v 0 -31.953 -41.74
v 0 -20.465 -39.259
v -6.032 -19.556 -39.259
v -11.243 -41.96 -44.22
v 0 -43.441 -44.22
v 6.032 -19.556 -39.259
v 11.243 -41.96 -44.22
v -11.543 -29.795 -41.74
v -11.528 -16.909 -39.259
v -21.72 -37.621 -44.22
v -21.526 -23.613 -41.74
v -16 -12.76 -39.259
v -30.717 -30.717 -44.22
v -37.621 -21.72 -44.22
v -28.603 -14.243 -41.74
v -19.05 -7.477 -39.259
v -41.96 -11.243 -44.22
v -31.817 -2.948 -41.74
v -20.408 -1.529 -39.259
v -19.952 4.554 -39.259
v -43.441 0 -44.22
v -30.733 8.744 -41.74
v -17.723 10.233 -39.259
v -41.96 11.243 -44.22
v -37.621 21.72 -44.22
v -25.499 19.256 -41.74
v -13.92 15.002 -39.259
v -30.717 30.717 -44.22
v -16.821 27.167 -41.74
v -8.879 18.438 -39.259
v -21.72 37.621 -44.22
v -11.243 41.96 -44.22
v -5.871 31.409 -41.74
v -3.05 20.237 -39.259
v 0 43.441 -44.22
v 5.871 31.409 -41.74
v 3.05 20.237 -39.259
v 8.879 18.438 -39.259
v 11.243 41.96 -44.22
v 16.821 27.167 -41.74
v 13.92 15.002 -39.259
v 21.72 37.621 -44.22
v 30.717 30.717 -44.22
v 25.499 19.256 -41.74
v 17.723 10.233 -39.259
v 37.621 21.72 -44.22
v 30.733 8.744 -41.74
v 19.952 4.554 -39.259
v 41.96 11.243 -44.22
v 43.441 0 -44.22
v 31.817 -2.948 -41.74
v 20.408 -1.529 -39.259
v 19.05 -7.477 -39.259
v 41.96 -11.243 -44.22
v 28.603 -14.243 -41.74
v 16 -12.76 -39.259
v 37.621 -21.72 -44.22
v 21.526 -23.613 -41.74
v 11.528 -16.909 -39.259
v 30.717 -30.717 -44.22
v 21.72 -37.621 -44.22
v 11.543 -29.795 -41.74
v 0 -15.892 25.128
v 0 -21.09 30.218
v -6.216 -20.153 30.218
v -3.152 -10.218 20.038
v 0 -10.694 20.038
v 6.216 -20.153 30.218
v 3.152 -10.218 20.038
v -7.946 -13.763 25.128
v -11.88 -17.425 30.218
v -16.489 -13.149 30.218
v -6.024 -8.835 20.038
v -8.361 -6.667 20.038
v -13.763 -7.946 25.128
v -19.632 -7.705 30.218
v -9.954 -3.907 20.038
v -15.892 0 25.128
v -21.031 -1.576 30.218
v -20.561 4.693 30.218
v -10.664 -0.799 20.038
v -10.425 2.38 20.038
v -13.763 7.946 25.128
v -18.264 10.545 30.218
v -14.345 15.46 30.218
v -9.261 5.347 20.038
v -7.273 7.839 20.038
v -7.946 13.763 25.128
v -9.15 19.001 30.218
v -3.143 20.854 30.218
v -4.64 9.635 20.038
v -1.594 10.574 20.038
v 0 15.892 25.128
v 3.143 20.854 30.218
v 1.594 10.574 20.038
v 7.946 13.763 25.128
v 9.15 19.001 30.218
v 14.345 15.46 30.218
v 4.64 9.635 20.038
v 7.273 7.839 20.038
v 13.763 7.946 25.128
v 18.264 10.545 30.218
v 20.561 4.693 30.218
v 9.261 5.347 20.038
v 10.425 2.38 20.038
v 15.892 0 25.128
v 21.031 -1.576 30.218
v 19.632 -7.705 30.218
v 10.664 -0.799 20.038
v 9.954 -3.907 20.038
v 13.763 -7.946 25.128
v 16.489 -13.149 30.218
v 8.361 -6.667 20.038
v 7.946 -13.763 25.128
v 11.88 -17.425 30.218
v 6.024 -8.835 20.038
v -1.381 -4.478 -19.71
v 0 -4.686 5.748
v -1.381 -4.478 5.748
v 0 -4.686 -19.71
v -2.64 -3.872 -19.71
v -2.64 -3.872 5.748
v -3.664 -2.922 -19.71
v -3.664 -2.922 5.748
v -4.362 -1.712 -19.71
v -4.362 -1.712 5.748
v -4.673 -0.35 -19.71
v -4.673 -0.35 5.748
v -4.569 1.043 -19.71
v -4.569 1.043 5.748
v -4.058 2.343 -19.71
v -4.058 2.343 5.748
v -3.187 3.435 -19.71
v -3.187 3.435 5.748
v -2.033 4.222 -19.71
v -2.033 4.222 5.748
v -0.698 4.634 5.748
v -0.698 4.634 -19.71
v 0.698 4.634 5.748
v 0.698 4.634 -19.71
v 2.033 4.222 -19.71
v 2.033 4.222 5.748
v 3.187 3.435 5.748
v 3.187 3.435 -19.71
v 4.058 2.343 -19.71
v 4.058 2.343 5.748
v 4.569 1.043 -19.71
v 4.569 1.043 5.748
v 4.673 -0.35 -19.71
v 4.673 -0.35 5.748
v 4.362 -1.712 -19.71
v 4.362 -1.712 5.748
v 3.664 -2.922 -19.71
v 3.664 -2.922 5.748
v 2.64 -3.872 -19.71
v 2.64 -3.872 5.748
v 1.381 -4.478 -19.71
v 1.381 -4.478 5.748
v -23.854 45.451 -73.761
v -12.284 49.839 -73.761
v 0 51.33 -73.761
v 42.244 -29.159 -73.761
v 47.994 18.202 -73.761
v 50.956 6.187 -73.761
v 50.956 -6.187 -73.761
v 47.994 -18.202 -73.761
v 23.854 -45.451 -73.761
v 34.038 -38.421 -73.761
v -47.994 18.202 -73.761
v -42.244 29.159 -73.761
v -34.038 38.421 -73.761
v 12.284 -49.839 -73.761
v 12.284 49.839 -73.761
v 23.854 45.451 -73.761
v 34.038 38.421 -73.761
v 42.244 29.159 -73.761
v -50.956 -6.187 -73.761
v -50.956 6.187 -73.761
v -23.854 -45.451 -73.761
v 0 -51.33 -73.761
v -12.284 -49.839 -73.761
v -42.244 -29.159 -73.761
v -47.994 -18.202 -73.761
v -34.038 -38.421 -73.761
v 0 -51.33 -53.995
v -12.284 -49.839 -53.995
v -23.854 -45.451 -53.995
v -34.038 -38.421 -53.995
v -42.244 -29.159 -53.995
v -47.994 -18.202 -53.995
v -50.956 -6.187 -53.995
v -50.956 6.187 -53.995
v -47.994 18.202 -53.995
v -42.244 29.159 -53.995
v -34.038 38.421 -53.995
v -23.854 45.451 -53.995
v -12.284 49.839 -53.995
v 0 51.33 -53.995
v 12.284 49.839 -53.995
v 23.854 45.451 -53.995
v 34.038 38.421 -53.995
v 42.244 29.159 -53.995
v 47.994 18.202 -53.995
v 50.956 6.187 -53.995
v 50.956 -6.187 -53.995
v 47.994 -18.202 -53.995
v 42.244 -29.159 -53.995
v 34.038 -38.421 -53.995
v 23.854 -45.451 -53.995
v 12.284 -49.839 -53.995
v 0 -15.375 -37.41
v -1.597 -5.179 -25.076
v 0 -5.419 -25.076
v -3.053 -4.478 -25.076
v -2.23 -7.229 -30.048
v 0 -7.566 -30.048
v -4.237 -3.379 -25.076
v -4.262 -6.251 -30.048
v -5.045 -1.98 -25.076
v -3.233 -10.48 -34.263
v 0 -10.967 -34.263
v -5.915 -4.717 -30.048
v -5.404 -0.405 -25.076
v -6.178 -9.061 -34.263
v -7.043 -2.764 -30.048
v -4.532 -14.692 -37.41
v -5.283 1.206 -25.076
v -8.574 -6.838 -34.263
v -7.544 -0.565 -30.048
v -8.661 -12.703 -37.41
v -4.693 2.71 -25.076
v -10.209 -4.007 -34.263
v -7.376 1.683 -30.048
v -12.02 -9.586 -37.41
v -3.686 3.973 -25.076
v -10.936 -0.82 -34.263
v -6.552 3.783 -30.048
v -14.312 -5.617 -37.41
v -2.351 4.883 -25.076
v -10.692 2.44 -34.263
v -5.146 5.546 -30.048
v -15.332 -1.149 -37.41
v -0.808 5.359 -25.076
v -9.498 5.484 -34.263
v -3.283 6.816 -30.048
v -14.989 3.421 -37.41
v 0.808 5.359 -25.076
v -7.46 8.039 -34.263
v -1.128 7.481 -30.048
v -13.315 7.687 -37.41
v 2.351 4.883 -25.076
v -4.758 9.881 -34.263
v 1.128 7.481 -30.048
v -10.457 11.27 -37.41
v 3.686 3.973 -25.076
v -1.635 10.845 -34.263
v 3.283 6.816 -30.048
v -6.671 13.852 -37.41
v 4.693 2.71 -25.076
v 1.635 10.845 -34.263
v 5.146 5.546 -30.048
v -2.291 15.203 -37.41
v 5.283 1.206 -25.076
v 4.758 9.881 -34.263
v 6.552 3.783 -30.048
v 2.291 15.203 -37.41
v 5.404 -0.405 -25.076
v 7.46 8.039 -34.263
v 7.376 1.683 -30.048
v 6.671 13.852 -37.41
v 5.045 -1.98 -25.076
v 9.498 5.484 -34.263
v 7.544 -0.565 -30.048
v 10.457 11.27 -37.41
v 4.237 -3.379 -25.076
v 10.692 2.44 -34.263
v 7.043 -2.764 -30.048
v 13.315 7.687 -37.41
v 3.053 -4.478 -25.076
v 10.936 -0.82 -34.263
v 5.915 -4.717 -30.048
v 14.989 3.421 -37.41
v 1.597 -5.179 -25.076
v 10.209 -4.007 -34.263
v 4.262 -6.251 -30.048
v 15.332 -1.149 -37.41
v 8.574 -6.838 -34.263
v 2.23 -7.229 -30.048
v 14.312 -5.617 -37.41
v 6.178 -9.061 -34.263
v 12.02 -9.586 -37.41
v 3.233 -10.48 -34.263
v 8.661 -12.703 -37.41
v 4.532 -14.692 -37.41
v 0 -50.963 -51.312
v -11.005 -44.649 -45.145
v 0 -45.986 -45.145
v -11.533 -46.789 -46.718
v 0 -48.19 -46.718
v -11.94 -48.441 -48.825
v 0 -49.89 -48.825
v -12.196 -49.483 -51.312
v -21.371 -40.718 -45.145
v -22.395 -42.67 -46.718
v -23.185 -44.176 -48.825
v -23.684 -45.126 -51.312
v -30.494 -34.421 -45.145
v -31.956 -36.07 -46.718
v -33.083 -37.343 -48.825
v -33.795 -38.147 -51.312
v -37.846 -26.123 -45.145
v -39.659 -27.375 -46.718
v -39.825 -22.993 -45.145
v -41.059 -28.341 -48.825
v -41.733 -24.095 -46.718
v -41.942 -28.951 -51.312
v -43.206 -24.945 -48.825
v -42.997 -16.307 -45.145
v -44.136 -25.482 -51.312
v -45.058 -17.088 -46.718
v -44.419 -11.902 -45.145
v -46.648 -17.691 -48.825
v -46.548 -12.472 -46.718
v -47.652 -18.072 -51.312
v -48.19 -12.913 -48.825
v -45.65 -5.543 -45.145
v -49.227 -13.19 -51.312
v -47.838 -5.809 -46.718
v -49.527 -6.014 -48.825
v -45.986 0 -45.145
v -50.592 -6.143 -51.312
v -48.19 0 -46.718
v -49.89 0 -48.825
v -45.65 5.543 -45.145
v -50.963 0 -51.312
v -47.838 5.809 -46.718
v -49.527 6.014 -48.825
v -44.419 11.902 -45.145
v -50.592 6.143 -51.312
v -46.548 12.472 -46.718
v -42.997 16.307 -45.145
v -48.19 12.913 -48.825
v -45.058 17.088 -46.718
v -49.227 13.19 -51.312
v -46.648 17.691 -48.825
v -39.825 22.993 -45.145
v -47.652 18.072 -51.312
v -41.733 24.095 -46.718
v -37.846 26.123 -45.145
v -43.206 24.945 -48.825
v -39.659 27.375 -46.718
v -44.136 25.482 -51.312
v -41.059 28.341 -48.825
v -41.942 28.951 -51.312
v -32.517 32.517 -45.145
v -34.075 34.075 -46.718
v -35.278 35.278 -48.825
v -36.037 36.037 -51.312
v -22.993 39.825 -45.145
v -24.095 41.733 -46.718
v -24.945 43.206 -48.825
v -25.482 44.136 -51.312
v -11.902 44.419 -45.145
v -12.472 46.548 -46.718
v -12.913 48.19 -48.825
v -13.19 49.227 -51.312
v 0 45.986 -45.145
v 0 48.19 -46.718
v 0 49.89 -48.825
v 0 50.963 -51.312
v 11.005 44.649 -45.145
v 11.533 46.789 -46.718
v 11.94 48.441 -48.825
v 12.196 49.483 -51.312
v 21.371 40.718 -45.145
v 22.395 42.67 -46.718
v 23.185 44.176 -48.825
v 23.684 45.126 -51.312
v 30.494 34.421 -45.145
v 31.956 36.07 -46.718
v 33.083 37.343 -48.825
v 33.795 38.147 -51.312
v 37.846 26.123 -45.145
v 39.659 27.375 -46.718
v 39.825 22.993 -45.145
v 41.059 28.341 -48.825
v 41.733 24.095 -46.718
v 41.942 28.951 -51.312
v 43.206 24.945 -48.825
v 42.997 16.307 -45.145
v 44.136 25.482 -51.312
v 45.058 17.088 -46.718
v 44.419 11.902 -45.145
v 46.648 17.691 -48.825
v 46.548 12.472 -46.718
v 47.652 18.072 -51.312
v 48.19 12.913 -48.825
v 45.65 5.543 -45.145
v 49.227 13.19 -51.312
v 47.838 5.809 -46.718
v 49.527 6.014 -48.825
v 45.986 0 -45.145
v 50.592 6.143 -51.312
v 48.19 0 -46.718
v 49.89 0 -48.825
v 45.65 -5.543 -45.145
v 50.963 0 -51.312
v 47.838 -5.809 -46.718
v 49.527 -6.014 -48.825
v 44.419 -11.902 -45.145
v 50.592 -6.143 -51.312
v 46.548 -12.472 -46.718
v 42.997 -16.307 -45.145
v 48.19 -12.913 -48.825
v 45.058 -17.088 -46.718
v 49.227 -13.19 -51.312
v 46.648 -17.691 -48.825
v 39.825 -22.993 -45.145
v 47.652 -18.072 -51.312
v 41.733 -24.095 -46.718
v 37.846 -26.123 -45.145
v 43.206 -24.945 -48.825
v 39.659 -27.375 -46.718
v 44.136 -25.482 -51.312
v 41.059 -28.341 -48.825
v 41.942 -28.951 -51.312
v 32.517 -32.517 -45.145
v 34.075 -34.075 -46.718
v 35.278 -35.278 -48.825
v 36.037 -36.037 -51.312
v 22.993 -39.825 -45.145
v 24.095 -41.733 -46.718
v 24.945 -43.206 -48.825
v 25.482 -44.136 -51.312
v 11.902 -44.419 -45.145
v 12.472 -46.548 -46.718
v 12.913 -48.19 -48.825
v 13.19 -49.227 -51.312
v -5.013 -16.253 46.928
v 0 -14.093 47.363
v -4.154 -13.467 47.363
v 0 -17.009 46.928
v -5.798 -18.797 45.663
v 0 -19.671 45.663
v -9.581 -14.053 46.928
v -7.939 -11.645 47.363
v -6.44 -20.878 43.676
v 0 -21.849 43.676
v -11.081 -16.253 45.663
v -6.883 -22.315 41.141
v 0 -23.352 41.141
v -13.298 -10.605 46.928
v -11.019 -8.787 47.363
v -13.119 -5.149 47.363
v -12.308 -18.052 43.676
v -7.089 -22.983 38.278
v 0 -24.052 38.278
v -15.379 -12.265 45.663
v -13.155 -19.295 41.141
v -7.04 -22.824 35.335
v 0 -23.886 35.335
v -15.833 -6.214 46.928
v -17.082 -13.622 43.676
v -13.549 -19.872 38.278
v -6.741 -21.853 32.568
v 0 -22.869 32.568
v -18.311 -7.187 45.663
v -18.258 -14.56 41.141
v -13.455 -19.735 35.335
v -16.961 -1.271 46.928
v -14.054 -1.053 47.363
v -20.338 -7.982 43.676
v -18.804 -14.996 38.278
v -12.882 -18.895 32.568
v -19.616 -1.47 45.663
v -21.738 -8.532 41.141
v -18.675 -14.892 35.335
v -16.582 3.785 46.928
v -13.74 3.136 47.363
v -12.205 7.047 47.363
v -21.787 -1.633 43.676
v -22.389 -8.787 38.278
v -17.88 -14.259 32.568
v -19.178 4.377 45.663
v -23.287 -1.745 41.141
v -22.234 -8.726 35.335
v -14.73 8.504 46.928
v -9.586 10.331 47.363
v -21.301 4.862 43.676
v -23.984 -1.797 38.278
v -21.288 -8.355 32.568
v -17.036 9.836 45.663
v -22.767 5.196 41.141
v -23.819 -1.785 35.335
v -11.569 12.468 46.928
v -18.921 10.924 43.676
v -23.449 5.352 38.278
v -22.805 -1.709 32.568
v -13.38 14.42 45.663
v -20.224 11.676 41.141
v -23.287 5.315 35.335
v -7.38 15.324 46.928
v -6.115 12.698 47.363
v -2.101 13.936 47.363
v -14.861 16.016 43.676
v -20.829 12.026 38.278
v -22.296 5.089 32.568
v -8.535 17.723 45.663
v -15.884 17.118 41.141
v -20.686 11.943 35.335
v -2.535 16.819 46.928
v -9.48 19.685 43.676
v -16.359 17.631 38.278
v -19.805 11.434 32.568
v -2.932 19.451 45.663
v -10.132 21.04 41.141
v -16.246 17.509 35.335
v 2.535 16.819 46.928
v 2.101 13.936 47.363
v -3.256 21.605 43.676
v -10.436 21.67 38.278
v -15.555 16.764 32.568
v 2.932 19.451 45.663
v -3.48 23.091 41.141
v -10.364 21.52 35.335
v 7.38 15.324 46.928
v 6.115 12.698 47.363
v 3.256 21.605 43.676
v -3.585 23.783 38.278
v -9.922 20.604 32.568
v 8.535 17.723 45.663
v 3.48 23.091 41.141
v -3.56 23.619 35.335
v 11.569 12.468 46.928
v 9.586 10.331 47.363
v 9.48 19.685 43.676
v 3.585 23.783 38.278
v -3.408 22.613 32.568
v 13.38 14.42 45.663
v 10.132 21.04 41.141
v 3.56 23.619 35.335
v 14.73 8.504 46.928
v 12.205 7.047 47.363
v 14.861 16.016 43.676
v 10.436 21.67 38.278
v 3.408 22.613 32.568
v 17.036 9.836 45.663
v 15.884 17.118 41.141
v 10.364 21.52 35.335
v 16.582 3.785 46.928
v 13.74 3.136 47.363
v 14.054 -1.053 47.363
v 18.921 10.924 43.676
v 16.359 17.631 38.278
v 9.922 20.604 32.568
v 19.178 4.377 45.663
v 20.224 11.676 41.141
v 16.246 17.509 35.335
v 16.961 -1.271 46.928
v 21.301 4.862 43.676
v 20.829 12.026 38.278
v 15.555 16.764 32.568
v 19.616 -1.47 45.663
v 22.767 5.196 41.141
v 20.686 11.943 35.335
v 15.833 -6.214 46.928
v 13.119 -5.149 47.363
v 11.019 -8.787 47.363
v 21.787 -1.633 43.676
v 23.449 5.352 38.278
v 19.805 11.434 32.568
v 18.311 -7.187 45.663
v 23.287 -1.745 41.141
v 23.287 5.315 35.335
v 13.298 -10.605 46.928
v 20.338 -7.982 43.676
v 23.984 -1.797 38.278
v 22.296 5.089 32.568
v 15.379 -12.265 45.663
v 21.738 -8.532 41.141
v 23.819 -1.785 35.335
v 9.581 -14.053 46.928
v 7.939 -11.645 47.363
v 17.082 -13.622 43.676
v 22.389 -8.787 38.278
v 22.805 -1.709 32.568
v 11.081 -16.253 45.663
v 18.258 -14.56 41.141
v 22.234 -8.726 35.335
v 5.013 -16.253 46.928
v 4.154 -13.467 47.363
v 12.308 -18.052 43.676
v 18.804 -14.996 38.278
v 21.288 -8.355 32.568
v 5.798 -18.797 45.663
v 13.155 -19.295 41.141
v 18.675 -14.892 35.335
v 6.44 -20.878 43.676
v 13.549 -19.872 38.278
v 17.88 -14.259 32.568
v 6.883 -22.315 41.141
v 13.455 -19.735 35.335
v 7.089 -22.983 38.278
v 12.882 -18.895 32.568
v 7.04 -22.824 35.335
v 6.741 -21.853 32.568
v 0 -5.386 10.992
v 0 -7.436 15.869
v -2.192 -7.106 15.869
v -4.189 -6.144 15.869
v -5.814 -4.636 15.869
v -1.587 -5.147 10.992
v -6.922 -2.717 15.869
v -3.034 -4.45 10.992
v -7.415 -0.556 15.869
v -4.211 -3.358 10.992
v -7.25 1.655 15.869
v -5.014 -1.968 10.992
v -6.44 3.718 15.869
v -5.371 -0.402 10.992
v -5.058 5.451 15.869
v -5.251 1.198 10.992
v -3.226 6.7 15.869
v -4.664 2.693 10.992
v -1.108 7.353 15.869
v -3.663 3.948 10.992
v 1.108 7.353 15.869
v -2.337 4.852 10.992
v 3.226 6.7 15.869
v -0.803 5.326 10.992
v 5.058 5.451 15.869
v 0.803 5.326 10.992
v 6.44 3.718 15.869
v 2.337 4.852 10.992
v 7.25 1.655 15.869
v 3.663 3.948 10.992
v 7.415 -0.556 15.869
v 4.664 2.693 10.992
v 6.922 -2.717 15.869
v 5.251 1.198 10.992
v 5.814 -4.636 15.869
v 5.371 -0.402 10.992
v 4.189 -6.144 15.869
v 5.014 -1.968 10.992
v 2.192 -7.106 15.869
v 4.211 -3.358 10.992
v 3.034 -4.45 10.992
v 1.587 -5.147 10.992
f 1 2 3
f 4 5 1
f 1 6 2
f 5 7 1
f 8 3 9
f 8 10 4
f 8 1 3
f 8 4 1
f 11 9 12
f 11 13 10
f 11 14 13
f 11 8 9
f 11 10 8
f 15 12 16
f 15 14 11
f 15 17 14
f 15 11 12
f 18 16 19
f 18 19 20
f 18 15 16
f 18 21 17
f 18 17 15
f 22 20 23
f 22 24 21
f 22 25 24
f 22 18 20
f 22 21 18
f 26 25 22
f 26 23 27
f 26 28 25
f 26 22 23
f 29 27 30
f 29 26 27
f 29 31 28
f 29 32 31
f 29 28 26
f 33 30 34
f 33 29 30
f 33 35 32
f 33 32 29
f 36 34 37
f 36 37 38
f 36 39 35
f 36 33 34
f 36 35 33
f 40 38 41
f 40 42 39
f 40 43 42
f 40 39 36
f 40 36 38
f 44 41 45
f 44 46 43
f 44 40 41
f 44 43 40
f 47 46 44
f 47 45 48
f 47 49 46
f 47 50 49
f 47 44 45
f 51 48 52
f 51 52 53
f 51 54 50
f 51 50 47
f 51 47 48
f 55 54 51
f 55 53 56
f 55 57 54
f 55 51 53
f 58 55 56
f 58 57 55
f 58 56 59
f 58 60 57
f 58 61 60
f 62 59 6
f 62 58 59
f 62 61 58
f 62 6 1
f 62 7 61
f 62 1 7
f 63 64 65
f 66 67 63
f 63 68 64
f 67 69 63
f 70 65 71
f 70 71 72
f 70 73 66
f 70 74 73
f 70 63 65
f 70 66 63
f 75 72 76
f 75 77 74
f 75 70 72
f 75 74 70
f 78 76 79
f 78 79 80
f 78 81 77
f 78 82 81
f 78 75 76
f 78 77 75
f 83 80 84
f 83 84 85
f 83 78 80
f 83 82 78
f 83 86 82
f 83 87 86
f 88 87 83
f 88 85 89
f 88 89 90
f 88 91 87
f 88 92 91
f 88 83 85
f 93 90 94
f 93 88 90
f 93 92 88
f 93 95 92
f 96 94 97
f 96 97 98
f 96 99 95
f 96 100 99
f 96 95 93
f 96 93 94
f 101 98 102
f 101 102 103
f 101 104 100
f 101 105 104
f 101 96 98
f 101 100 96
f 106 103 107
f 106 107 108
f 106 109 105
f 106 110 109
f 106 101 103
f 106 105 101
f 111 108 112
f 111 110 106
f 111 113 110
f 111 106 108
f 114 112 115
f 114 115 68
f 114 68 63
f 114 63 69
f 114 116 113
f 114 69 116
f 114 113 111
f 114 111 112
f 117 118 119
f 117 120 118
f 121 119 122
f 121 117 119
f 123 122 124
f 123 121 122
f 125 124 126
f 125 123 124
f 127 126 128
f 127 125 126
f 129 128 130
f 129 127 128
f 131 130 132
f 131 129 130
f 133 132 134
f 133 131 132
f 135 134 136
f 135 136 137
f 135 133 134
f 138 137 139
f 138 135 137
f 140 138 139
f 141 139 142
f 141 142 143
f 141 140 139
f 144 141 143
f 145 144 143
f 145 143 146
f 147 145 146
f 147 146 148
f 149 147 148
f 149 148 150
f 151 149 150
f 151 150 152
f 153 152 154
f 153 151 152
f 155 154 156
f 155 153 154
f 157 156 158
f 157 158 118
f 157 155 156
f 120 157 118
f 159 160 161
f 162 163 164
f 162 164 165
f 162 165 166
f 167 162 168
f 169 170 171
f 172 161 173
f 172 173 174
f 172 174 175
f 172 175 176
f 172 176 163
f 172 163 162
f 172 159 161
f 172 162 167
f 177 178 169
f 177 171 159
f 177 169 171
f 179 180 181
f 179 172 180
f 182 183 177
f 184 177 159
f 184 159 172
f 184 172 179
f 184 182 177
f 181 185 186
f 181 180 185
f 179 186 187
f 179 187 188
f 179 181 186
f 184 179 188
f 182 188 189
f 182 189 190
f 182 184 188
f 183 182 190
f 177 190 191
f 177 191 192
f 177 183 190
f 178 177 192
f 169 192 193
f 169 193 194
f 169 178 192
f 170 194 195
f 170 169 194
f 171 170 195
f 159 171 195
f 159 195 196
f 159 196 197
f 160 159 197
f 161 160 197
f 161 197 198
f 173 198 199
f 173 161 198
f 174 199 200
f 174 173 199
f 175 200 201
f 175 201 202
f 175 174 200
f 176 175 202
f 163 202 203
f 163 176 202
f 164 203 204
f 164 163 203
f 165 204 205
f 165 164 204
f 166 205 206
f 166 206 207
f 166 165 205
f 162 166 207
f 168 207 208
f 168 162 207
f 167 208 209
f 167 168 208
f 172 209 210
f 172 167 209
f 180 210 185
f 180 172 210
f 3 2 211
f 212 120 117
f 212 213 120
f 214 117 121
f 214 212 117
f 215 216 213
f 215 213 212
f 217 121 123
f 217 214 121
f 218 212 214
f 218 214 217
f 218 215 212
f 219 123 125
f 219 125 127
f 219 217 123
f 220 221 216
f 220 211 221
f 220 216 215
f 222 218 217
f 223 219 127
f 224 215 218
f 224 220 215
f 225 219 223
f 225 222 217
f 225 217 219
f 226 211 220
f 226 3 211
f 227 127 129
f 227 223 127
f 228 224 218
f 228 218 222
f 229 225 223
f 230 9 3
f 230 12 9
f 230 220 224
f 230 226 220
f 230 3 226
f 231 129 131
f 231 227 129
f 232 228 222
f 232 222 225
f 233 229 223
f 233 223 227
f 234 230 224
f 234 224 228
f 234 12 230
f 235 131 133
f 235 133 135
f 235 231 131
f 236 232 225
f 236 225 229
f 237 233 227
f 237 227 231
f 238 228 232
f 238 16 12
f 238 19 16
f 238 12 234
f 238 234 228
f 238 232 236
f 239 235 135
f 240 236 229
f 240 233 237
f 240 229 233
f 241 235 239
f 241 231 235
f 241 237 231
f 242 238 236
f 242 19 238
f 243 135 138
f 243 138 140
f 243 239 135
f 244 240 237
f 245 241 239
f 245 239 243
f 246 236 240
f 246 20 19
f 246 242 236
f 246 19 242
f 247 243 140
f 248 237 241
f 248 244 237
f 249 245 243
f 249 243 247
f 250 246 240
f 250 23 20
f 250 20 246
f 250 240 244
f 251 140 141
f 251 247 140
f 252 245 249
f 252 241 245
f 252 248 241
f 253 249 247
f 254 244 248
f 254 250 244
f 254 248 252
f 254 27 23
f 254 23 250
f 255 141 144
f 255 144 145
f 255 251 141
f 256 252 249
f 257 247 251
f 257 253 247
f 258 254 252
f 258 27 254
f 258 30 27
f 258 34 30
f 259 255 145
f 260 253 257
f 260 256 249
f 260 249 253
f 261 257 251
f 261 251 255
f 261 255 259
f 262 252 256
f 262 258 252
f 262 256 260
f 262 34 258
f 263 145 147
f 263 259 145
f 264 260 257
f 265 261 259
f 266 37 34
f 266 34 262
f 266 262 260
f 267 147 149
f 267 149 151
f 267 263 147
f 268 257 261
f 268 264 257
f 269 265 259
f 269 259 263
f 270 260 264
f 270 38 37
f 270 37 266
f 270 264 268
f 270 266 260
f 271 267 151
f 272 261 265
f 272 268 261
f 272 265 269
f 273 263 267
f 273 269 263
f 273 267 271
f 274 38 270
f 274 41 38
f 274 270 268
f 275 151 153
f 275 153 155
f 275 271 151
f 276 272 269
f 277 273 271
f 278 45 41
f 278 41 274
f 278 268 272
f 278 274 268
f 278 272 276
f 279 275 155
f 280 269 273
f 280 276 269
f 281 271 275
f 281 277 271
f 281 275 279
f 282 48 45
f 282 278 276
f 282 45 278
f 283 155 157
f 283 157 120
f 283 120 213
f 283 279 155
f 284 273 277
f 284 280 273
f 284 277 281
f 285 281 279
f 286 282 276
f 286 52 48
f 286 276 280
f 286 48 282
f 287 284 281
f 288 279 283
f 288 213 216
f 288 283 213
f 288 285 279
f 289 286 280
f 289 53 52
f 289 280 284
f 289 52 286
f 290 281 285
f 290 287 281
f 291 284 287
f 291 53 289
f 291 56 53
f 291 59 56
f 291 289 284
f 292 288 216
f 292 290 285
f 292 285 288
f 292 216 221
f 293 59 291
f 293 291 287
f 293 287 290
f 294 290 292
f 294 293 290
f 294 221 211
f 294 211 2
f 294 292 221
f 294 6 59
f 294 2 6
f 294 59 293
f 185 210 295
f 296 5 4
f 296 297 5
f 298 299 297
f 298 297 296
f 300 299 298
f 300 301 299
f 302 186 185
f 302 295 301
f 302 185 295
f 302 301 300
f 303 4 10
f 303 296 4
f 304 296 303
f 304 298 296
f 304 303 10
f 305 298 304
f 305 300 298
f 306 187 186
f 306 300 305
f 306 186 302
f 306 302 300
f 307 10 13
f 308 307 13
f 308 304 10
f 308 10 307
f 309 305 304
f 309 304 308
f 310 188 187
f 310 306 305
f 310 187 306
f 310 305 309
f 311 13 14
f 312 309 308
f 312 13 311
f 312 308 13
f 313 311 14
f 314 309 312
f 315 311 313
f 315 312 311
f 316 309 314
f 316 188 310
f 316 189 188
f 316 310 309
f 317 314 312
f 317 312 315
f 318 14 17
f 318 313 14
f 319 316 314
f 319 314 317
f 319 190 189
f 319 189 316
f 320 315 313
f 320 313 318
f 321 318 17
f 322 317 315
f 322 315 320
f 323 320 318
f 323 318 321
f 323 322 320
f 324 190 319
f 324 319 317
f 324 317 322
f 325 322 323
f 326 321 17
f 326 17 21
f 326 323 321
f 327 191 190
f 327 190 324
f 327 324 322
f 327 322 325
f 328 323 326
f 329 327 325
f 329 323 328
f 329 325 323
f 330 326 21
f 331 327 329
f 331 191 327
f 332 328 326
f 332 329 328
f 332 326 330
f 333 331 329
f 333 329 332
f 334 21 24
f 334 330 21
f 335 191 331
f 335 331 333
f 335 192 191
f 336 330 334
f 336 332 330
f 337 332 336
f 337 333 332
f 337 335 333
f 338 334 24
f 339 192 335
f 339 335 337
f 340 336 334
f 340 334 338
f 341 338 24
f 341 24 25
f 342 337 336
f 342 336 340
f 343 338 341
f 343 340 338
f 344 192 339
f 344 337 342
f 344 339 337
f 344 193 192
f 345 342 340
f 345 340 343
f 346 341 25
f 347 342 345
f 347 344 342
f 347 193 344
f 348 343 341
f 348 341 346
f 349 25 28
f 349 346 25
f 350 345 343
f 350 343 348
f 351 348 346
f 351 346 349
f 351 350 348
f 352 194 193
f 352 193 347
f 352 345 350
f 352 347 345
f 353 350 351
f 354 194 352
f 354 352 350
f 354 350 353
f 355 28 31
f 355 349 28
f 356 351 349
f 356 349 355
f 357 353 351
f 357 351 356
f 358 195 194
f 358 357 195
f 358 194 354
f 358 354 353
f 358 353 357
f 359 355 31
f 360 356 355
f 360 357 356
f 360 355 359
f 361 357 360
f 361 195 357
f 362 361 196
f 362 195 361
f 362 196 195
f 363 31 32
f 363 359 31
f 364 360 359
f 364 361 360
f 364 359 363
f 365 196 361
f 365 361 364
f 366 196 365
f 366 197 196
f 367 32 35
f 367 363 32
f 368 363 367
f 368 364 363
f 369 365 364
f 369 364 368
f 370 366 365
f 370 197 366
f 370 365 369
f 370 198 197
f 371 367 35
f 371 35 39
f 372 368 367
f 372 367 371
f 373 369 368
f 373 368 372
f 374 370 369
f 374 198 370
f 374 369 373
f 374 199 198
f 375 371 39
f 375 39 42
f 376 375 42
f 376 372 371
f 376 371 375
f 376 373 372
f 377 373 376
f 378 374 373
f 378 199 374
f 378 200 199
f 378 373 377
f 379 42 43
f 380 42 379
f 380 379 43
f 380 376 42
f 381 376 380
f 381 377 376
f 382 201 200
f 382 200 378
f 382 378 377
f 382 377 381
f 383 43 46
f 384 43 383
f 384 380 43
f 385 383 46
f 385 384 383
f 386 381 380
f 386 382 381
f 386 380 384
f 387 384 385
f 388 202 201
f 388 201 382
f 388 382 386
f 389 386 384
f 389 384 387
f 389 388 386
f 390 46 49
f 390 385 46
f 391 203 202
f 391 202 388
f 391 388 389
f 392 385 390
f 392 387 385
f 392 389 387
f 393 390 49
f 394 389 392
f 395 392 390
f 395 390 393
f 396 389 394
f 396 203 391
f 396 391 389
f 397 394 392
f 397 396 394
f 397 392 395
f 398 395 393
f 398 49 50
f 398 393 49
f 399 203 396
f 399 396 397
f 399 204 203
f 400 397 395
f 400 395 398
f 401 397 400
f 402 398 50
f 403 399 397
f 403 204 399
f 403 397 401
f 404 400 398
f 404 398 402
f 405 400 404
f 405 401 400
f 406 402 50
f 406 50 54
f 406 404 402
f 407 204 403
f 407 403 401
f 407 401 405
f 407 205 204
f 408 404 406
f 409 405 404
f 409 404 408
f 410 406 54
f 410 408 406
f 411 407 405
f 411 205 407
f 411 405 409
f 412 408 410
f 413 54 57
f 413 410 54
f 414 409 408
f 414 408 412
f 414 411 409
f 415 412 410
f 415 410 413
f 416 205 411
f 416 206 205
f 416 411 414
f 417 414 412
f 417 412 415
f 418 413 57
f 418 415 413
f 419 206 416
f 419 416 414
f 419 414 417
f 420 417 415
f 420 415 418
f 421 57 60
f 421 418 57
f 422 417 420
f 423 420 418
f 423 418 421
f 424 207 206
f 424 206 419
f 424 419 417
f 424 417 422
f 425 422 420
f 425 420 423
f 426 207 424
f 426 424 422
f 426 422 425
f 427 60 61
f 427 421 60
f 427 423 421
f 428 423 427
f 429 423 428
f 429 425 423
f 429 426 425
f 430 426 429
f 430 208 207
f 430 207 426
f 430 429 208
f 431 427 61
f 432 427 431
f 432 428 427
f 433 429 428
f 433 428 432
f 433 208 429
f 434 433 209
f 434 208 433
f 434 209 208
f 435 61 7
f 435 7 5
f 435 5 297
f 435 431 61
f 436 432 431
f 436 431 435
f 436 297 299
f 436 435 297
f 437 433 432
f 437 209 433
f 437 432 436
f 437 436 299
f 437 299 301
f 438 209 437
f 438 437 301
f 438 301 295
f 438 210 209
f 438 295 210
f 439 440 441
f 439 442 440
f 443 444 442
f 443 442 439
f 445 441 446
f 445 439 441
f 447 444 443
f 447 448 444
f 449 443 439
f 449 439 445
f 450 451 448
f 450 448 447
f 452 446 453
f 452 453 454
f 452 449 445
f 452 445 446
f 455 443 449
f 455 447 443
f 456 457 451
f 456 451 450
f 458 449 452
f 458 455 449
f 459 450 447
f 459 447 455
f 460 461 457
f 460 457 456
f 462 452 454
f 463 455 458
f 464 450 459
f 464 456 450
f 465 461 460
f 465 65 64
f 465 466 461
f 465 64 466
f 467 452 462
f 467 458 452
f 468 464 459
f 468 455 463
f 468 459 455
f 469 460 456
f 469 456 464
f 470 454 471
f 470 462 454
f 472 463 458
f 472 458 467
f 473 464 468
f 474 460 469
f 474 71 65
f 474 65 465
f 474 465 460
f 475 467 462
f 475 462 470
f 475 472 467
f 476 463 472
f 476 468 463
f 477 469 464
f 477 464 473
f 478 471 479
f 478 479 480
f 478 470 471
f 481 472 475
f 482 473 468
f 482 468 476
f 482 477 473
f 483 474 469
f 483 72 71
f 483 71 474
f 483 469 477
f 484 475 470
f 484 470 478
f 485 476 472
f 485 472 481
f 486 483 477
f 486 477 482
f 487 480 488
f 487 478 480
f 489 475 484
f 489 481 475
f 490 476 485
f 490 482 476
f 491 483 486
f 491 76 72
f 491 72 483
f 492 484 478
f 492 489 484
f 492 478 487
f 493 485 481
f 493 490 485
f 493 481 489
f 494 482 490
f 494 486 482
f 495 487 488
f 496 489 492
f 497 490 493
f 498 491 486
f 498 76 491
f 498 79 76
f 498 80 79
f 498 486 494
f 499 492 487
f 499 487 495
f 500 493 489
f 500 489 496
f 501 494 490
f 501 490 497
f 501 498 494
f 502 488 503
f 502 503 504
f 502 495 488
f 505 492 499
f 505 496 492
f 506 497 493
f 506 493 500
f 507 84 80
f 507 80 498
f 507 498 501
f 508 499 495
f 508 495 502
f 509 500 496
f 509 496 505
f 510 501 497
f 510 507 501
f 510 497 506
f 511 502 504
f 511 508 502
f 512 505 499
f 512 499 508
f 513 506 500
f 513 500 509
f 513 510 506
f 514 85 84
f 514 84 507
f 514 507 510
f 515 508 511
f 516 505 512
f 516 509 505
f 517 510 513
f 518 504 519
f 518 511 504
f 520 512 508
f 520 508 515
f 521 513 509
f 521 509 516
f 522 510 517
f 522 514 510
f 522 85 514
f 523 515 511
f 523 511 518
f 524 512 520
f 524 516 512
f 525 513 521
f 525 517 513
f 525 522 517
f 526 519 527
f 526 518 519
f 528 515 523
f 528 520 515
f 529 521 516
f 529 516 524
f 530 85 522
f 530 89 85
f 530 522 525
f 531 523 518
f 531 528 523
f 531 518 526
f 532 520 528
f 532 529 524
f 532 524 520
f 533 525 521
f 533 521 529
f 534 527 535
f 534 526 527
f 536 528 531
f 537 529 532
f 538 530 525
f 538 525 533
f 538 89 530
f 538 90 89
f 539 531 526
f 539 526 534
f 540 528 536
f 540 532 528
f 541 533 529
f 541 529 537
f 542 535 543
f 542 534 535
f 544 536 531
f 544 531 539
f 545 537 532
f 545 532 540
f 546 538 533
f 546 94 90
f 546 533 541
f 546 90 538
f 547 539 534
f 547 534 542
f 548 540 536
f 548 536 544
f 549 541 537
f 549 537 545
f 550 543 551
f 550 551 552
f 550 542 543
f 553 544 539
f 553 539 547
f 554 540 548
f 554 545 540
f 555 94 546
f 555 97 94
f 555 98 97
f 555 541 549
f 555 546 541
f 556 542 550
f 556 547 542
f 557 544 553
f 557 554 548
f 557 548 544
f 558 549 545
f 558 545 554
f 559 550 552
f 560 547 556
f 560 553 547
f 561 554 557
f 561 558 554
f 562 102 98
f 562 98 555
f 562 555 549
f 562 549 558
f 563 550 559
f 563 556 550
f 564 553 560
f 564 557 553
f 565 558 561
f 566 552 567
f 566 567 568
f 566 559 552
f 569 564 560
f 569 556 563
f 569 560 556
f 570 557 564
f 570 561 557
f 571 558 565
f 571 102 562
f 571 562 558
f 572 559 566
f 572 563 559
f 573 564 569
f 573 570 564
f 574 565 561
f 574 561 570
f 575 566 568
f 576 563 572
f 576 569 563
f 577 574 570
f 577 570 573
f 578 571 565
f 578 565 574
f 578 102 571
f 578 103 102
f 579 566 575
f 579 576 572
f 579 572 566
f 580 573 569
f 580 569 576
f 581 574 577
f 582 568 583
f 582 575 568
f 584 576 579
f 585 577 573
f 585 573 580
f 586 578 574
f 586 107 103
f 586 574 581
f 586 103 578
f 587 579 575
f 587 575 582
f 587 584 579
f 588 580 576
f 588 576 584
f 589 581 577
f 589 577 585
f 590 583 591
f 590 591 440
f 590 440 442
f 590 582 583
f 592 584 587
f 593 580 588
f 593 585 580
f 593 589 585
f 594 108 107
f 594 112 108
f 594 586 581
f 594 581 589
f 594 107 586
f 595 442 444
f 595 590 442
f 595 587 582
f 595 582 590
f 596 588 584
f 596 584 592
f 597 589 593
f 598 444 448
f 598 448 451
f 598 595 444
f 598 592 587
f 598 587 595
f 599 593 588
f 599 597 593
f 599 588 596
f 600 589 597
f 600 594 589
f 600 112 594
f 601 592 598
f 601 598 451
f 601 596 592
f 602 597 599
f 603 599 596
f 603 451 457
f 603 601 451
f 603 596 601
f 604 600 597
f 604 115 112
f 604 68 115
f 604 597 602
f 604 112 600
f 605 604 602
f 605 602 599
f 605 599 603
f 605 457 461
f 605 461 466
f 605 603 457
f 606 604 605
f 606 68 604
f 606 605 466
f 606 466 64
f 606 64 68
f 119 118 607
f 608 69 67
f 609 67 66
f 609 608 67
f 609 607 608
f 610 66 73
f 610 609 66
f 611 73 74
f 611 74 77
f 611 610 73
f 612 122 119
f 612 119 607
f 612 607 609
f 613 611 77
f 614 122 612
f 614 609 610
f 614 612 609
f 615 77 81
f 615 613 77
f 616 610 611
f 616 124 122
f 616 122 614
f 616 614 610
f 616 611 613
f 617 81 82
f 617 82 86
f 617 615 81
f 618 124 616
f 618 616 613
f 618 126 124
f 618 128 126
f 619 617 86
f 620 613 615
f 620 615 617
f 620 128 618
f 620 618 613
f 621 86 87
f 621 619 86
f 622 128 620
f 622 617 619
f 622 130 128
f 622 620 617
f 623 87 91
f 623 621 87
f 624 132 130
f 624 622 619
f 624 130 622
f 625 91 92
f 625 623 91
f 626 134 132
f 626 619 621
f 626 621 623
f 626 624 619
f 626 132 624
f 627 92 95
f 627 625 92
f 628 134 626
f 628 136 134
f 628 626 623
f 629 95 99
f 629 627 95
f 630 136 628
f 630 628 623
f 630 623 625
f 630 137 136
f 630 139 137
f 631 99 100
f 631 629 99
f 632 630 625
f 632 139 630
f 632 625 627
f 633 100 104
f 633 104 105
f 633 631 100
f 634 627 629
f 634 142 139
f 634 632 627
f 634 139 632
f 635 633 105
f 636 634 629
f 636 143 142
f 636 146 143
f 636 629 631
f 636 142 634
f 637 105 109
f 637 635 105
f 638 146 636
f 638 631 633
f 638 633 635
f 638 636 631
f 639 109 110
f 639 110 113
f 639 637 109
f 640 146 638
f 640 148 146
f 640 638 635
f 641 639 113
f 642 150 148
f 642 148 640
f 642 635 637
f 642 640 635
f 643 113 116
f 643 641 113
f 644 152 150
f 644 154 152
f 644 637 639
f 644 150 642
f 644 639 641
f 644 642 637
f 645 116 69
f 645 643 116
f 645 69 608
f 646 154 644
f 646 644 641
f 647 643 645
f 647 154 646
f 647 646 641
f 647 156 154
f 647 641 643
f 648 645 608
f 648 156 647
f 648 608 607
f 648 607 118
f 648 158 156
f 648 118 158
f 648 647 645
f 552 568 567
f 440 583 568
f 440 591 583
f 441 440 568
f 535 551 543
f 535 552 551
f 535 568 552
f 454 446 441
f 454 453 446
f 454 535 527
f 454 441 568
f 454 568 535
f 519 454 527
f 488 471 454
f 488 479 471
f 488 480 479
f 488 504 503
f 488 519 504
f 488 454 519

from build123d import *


with BuildPart() as f1:
    # F0 (on Right) → F1 (revolve)
    with BuildSketch(Plane.YZ):
        with BuildLine():
            Line((-51.330089, -73.760578), (0, -73.760578))
            Line((0, -73.760578), (0, 47.362838))
            Line((0, 47.362838), (-14.093457, 47.362838))
            ThreePointArc((-14.093457, 47.362838), (-23.352265, 41.140996), (-21.089705, 30.217734))
            Line((-21.089705, 30.217734), (-10.693563, 20.038178))
            ThreePointArc((-10.693563, 20.038178), (-6.249005, 13.498779), (-4.686059, 5.74797))
            Line((-4.686059, 5.74797), (-4.686059, -19.709873))
            ThreePointArc((-4.686059, -19.709873), (-9.122987, -32.271354), (-20.46514, -39.259396))
            Line((-20.46514, -39.259396), (-43.440548, -44.219994))
            ThreePointArc((-43.440548, -44.219994), (-49.111624, -47.714015), (-51.330089, -53.994756))
            Line((-51.330089, -53.994756), (-51.330089, -73.760578))
        make_face()
    revolve(axis=Axis((0, 0, -13.19887), (0, 0, -1)))


solid = f1.part
